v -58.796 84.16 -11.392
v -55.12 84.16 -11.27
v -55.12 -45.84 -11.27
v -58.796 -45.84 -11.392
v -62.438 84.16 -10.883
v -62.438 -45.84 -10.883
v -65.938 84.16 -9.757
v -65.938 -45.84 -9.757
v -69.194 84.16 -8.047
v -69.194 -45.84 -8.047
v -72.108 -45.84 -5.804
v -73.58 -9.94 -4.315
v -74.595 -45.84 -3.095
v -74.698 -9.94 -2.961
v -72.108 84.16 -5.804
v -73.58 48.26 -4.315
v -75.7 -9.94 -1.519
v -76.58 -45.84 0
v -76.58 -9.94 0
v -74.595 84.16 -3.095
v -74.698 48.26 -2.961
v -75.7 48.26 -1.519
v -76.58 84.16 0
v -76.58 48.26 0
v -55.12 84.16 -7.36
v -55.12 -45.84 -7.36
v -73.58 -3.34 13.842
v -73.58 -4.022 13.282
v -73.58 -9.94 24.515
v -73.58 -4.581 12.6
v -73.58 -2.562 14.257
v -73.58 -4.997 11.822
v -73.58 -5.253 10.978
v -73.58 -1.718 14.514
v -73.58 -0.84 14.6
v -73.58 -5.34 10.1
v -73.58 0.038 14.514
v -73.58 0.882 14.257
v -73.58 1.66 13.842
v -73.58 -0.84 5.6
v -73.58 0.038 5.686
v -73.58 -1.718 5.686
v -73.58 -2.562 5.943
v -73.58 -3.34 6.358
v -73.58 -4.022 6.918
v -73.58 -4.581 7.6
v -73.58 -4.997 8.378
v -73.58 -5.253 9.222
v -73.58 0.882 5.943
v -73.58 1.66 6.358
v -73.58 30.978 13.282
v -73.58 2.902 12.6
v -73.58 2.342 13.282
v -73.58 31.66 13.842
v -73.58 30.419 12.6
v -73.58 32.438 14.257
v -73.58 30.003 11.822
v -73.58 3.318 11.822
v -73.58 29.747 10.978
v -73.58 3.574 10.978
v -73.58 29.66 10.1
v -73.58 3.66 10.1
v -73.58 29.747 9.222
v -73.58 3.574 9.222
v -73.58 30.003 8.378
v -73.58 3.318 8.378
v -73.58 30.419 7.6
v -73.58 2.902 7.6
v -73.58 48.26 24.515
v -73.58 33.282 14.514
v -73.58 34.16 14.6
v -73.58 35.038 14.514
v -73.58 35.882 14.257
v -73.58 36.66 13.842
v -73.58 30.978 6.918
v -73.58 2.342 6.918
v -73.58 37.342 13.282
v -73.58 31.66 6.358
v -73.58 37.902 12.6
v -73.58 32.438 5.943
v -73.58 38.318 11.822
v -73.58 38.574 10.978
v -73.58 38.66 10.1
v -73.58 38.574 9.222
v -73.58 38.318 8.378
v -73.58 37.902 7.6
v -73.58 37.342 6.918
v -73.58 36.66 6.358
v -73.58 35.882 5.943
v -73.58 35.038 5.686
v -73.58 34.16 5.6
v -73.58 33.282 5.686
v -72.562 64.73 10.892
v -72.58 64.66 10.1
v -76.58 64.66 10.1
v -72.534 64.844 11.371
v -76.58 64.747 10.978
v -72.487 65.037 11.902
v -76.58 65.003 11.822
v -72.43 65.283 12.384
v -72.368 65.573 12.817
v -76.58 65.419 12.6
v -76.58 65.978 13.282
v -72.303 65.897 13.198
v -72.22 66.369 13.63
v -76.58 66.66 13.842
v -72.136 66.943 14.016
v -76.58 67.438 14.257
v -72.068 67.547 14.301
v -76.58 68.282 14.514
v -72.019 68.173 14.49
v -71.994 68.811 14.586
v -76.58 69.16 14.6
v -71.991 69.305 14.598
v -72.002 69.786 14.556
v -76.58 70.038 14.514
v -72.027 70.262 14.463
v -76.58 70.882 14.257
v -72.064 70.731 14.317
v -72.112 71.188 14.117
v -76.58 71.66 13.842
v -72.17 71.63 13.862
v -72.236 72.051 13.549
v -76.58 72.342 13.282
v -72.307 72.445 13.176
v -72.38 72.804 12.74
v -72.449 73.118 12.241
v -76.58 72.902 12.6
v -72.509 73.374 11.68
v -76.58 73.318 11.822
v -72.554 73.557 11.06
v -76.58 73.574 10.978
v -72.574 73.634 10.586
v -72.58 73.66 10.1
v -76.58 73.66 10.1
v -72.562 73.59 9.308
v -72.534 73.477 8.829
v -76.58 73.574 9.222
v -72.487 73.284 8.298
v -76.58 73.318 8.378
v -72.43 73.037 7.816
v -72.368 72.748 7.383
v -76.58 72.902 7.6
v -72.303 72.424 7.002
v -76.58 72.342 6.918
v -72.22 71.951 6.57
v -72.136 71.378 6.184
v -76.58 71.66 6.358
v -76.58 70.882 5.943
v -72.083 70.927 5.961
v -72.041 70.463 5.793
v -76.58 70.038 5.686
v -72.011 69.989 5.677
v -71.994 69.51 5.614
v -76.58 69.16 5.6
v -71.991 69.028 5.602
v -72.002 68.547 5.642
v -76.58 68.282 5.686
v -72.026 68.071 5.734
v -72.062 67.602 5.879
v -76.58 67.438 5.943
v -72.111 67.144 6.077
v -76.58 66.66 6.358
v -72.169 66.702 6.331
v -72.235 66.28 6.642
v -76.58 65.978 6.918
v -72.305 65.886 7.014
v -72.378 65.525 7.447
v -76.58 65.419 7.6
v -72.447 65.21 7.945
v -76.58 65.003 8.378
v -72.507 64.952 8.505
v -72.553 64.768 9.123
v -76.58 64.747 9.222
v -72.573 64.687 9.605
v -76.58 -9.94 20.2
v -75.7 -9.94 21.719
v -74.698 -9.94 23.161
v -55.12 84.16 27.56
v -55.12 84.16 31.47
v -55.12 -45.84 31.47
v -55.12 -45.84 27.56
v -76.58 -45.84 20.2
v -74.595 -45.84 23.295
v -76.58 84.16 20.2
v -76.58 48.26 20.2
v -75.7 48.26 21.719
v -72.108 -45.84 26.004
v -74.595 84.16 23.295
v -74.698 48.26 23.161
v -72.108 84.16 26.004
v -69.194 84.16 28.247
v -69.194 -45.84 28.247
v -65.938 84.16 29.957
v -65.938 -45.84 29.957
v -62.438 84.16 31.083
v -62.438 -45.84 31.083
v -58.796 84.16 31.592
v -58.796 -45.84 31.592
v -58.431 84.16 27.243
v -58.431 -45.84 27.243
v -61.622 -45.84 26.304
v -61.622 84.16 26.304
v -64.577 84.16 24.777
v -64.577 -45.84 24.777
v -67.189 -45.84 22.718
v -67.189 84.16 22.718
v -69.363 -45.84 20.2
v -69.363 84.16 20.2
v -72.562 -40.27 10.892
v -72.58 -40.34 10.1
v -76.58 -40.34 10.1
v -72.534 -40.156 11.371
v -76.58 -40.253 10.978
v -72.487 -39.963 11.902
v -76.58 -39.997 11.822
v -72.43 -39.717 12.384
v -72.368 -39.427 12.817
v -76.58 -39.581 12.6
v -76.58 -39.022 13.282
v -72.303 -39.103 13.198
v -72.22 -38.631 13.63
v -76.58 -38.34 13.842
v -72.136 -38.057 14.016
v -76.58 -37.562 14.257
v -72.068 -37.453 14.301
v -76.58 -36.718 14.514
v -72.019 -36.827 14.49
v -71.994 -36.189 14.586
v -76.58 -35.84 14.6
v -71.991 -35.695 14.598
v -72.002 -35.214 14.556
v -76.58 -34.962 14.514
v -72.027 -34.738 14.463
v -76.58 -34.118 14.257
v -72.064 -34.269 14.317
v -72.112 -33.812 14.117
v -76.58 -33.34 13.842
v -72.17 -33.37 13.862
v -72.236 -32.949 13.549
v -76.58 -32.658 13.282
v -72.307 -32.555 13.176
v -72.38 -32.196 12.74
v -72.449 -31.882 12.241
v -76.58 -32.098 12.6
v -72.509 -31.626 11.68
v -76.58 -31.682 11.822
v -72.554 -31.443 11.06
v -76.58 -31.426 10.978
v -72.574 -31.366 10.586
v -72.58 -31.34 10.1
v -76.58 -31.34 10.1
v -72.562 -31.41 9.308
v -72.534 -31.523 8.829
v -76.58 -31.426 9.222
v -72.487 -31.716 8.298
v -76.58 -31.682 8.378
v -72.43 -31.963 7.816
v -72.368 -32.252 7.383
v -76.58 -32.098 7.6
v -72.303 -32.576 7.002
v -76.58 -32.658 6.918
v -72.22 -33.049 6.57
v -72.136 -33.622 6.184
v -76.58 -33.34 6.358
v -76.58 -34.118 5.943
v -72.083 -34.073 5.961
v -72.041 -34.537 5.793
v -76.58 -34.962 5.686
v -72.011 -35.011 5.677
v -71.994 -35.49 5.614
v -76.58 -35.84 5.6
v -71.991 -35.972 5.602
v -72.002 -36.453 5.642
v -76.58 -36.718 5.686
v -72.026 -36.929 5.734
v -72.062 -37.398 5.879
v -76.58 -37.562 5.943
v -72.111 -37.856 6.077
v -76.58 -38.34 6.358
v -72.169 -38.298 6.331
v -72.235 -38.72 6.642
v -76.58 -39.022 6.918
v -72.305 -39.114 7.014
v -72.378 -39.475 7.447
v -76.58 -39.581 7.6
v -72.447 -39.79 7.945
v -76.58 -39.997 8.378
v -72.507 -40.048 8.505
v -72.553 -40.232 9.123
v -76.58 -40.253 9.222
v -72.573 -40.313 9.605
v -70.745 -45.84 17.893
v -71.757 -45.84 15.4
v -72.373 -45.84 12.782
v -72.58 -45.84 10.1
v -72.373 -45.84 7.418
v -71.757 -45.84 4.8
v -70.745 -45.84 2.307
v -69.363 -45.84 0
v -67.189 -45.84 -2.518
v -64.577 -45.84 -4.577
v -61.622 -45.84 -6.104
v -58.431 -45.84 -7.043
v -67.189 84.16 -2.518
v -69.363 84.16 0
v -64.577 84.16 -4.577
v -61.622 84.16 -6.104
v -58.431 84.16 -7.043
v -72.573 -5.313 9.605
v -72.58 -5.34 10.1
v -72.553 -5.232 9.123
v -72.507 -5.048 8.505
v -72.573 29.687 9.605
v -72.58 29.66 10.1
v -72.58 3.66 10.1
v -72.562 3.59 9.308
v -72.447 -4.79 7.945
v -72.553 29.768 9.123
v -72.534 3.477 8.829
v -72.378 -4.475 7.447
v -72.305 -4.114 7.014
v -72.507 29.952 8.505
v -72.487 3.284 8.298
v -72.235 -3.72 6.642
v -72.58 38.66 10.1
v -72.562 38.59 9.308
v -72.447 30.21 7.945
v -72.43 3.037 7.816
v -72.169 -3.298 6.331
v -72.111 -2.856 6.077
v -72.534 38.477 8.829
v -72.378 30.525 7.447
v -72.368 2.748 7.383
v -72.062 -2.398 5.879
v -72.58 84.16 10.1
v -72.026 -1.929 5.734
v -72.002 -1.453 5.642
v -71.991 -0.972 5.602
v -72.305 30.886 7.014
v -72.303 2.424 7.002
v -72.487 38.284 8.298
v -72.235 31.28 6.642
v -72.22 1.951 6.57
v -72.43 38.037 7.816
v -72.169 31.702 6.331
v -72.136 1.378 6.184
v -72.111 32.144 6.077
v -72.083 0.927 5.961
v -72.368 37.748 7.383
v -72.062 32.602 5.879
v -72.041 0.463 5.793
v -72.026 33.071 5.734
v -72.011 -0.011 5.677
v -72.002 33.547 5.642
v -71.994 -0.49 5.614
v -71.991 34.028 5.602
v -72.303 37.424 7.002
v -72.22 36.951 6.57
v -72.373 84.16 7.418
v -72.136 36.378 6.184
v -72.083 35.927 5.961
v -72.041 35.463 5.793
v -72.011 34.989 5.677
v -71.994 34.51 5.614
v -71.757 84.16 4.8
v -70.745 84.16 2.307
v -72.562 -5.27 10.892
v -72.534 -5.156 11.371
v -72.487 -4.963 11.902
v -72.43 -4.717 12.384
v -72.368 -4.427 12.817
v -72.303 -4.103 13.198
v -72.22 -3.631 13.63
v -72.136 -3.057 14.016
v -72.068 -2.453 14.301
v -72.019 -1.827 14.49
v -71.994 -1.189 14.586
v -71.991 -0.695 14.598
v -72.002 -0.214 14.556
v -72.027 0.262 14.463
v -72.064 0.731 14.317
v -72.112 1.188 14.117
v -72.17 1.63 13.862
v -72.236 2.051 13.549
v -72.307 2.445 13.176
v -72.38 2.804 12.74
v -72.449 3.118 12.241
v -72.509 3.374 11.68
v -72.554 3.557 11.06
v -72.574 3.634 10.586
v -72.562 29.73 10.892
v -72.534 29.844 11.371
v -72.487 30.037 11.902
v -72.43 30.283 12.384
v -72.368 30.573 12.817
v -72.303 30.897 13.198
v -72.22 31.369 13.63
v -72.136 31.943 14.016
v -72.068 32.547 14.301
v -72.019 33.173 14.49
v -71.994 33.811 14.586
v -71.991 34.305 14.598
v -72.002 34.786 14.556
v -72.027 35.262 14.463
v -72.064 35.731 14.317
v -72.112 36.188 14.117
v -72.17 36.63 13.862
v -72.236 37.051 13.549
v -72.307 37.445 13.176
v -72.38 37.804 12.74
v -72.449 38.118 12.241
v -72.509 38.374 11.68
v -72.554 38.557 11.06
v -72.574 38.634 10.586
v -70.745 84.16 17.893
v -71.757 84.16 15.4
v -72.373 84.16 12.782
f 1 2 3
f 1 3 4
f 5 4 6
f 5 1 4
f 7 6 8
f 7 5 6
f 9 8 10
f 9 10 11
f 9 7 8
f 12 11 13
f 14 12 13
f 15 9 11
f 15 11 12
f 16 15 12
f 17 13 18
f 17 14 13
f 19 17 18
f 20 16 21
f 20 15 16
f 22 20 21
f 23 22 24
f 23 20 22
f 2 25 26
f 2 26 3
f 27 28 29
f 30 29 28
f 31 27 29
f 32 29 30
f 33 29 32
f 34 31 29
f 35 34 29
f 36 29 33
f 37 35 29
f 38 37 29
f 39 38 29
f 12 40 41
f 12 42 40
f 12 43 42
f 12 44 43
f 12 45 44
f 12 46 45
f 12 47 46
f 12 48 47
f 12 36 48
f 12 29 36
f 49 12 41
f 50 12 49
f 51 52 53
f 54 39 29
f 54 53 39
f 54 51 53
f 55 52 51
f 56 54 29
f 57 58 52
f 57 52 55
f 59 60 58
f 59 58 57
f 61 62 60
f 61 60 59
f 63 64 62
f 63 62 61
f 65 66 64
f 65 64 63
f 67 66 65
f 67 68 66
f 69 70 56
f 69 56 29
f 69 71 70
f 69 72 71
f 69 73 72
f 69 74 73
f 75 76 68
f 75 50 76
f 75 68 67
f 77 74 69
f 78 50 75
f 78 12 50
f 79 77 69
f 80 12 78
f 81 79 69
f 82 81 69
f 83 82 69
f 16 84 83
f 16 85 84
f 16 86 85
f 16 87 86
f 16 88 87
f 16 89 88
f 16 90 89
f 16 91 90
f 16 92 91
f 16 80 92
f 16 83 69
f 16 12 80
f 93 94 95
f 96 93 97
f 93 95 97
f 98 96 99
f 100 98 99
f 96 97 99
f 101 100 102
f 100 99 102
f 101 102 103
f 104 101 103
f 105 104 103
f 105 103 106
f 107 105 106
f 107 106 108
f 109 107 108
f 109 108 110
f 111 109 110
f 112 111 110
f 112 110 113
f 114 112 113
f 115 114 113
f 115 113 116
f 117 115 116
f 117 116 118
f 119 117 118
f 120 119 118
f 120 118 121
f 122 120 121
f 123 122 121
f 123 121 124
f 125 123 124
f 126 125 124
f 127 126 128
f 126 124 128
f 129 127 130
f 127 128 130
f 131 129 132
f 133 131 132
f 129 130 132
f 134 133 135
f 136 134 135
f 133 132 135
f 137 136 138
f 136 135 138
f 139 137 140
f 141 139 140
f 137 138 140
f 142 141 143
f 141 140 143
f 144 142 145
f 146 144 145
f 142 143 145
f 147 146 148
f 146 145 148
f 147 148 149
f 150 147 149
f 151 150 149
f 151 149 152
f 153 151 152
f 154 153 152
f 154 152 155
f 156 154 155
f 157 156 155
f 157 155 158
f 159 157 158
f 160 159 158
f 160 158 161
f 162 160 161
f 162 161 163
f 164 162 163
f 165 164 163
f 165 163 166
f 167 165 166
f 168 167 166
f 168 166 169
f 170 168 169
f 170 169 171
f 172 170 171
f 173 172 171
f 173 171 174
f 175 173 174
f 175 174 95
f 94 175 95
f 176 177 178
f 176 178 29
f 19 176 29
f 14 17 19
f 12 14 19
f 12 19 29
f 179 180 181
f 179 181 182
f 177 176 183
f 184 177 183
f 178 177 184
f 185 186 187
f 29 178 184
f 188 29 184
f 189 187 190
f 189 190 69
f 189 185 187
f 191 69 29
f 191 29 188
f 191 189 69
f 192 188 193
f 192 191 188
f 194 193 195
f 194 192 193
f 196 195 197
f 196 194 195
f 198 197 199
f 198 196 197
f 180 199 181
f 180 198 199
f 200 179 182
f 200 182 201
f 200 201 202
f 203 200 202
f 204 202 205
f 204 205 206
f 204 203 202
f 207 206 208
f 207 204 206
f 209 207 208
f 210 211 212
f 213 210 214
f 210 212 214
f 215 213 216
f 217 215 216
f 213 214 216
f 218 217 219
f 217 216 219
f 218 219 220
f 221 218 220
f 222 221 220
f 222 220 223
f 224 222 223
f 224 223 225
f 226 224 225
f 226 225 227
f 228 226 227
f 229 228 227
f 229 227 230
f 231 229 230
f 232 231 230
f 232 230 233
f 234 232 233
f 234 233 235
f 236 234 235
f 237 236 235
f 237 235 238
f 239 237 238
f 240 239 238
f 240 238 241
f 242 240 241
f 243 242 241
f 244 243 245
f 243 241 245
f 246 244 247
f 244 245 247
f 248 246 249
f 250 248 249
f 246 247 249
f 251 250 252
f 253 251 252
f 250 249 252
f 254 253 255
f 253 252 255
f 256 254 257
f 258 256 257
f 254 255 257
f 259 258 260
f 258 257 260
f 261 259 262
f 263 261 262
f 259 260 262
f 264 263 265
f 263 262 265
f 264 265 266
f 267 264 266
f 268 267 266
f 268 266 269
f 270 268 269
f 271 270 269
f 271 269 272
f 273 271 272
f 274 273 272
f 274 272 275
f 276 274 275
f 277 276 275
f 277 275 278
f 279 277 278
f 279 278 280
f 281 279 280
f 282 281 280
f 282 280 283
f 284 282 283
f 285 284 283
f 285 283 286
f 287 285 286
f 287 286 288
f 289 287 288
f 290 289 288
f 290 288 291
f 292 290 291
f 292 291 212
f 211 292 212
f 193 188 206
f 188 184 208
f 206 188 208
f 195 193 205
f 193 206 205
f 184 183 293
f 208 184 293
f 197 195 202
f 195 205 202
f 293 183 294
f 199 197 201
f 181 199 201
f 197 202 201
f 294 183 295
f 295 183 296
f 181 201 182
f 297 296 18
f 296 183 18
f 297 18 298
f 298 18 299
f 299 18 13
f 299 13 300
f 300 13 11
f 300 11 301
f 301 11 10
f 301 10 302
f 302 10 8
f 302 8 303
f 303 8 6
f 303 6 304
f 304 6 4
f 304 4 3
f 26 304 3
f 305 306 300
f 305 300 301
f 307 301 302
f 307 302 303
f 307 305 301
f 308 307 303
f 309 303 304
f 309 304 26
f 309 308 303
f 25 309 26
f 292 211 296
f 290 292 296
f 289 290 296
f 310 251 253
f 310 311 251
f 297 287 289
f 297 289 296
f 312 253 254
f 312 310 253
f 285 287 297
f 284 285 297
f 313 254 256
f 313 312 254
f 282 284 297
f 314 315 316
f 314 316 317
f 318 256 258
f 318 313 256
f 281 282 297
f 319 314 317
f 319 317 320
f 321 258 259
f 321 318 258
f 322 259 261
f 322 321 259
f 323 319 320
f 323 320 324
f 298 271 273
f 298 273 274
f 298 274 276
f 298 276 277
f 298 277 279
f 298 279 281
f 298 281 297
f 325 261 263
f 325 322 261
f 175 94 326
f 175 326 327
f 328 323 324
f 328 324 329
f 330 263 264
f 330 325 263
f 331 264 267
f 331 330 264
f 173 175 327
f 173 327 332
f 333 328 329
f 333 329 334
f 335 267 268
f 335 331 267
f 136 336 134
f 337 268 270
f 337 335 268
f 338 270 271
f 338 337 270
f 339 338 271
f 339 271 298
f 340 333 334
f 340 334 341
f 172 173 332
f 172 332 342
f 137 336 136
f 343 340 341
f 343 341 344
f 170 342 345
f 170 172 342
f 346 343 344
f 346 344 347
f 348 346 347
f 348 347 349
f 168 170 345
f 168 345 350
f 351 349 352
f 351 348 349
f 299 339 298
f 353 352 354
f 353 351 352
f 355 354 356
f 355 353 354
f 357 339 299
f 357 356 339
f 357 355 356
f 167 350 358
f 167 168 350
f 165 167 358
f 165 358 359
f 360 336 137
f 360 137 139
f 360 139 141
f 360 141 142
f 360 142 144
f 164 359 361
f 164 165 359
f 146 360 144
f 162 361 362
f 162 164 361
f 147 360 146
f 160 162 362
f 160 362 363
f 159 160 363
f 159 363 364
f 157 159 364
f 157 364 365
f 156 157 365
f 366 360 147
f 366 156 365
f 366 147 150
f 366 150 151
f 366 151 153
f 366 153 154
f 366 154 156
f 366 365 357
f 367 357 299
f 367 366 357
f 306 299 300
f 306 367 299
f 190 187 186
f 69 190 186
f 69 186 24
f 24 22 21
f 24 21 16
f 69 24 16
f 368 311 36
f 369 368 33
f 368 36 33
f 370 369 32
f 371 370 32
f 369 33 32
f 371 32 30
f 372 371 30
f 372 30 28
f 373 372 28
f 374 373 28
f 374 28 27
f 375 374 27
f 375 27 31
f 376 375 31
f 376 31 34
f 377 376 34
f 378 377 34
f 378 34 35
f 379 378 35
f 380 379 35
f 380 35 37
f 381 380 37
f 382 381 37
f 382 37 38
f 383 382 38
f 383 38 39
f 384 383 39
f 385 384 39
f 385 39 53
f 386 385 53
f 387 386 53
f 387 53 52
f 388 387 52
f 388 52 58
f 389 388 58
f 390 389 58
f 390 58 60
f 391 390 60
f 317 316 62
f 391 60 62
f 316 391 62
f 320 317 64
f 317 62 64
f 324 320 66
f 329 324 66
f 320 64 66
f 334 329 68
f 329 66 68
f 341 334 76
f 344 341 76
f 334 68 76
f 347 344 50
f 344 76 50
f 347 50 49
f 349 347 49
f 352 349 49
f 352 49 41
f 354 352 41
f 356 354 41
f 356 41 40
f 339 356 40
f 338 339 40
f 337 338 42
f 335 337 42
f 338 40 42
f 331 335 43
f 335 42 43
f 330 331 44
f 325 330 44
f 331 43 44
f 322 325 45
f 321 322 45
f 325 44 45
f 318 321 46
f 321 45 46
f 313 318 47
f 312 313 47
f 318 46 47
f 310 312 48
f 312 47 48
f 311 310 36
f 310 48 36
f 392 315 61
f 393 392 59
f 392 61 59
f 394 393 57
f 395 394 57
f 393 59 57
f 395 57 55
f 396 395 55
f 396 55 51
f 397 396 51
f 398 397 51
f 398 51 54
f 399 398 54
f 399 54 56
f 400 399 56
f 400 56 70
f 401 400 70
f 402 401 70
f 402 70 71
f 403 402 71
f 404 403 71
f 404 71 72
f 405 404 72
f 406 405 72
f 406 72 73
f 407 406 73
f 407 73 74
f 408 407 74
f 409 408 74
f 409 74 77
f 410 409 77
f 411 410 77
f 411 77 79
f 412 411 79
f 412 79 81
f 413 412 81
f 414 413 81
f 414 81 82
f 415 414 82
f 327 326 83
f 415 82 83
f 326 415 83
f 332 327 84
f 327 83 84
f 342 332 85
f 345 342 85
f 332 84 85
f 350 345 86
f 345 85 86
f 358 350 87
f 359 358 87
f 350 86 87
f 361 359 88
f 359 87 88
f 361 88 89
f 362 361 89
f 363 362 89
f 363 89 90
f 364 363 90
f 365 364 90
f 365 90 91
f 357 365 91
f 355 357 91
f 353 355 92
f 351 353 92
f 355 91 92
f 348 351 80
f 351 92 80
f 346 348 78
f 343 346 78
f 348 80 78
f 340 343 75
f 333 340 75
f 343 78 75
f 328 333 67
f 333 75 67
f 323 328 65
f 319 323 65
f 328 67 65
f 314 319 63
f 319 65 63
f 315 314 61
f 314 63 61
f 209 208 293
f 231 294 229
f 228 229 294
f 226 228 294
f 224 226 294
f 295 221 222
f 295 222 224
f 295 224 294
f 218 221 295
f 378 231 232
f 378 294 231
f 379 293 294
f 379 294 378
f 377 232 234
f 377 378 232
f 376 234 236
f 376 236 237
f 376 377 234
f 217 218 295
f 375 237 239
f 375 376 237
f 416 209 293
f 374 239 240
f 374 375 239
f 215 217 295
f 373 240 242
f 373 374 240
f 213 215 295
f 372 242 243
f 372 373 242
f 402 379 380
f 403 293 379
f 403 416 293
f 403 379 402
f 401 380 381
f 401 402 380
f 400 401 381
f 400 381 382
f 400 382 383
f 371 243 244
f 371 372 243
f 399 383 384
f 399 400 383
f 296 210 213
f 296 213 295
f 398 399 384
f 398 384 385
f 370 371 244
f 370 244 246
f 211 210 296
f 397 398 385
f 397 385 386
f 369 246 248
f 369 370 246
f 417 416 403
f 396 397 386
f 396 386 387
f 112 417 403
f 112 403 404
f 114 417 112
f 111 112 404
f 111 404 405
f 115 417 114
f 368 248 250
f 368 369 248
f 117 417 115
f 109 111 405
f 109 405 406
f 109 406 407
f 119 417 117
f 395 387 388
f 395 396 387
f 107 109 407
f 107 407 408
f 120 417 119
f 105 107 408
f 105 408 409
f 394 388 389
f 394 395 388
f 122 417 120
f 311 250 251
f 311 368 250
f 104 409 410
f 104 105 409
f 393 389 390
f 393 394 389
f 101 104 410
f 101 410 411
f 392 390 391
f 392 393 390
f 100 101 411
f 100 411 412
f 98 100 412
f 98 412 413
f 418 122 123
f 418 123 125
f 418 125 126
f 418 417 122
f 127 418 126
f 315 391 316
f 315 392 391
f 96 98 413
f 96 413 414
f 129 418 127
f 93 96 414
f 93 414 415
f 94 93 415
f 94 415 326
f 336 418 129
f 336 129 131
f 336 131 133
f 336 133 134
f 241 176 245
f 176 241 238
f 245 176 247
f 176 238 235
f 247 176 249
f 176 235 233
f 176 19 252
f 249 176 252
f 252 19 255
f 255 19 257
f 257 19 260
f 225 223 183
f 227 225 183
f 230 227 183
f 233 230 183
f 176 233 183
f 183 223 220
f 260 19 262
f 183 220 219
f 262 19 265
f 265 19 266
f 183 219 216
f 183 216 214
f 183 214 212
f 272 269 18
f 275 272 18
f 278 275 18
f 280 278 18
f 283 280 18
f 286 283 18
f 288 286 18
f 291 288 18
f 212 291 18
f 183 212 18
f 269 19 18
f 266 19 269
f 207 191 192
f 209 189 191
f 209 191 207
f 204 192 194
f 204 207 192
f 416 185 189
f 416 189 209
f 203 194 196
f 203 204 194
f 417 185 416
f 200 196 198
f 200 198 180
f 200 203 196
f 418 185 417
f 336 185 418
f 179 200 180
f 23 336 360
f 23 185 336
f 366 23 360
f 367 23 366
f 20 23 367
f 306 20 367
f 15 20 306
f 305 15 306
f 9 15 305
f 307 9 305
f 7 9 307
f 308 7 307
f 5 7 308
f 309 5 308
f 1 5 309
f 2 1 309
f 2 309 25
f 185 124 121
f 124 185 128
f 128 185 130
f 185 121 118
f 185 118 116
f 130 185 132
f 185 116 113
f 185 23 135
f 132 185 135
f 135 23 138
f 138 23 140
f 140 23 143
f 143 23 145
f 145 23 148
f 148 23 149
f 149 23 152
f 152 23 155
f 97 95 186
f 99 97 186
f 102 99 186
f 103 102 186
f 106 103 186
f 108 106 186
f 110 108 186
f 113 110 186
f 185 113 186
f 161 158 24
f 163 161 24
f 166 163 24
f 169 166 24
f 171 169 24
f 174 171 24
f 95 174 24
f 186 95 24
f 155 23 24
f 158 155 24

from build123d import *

# Parameters (mm, degrees)
BOSS_EXTRUDE1_DEPTH     = 20.2
BOSS_EXTRUDE3_DEPTH     = 130
SKETCH7_R               = 4.5
CUT_EXTRUDE1_DEPTH      = 10
CUT_EXTRUDE2_DEPTH      = 119.099419302
CUT_EXTRUDE2_DEPTH_BACK = 119.099419302
SKETCH8_W               = 3
SKETCH8_H               = 58.2


with BuildPart() as part:
    # Sketch1 → Boss-Extrude1 (new body)
    with BuildSketch(Plane.XY):
        Polygon((-76.580441788, 84.160209426), (-76.580441788, 48.260209426), (-73.580441788, 48.260209426), (-73.580441788, -9.939790574), (-76.580441788, -9.939790574), (-76.580441788, -45.839790574), (-72.580441788, -45.839790574), (-72.580441788, 84.160209426), align=None)
    extrude(amount=BOSS_EXTRUDE1_DEPTH)

    # Sketch2 → Boss-Extrude3 (add)
    with BuildSketch(Plane(origin=(0, 84.160209426, 0), x_dir=(1, 0, 0), z_dir=(0, 1, 0))):
        with BuildLine():
            Line((-72.580441788, -20.2), (-76.580441788, -20.2))
            ThreePointArc((-76.580441788, -20.2), (-67.602885827, -29.171952003), (-55.120441788, -31.47))
            Line((-55.120441788, -31.47), (-55.120441788, -27.56))
            ThreePointArc((-55.120441788, -27.56), (-63.136226216, -25.611247532), (-69.362688802, -20.2))
            Line((-69.362688802, -20.2), (-72.580441788, -20.2))
        make_face()
        with BuildLine():
            Line((-76.580441788, 0), (-72.580441788, 0))
            Line((-72.580441788, 0), (-69.362688802, 0))
            ThreePointArc((-69.362688802, 0), (-63.136226216, 5.411247532), (-55.120441788, 7.36))
            Line((-55.120441788, 7.36), (-55.120441788, 11.27))
            ThreePointArc((-55.120441788, 11.27), (-67.602885827, 8.971952003), (-76.580441788, 0))
        make_face()
        with BuildLine():
            Line((-69.362688802, 0), (-72.580441788, 0))
            Line((-72.580441788, 0), (-72.580441788, -10.1))
            ThreePointArc((-72.580441788, -10.1), (-71.756565628, -4.799907211), (-69.362688802, 0))
        make_face()
        with BuildLine():
            ThreePointArc((-69.362688802, -20.2), (-71.756565628, -15.400092789), (-72.580441788, -10.1))
            Line((-72.580441788, -10.1), (-72.580441788, -20.2))
            Line((-72.580441788, -20.2), (-69.362688802, -20.2))
        make_face()
    extrude(amount=-BOSS_EXTRUDE3_DEPTH)

    # Sketch7 → Cut-Extrude1 (cut)
    with BuildSketch(Plane.ZY.offset(76.580441788)):
        with Locations(Location((10.1, 69.160209426, 0), (0, 0, 270))):
            Circle(SKETCH7_R)
        with Locations(Location((10.1, 34.160209426, 0), (0, 0, 270))):
            Circle(SKETCH7_R)
        with Locations(Location((10.1, -0.839790574, 0), (0, 0, 270))):
            Circle(SKETCH7_R)
        with Locations(Location((10.1, -35.839790574, 0), (0, 0, 270))):
            Circle(SKETCH7_R)
    extrude(amount=-CUT_EXTRUDE1_DEPTH, mode=Mode.SUBTRACT)

    # Sketch8 → Cut-Extrude2 (cut, two sides: drawn at the far end of the back side and taken through both)
    with BuildSketch(Plane.XY.offset(-CUT_EXTRUDE2_DEPTH_BACK)):
        with Locations((-75.080441788, 19.160209426)):
            Rectangle(SKETCH8_W, SKETCH8_H)
    extrude(amount=CUT_EXTRUDE2_DEPTH + CUT_EXTRUDE2_DEPTH_BACK, mode=Mode.SUBTRACT)


solid = part.part
